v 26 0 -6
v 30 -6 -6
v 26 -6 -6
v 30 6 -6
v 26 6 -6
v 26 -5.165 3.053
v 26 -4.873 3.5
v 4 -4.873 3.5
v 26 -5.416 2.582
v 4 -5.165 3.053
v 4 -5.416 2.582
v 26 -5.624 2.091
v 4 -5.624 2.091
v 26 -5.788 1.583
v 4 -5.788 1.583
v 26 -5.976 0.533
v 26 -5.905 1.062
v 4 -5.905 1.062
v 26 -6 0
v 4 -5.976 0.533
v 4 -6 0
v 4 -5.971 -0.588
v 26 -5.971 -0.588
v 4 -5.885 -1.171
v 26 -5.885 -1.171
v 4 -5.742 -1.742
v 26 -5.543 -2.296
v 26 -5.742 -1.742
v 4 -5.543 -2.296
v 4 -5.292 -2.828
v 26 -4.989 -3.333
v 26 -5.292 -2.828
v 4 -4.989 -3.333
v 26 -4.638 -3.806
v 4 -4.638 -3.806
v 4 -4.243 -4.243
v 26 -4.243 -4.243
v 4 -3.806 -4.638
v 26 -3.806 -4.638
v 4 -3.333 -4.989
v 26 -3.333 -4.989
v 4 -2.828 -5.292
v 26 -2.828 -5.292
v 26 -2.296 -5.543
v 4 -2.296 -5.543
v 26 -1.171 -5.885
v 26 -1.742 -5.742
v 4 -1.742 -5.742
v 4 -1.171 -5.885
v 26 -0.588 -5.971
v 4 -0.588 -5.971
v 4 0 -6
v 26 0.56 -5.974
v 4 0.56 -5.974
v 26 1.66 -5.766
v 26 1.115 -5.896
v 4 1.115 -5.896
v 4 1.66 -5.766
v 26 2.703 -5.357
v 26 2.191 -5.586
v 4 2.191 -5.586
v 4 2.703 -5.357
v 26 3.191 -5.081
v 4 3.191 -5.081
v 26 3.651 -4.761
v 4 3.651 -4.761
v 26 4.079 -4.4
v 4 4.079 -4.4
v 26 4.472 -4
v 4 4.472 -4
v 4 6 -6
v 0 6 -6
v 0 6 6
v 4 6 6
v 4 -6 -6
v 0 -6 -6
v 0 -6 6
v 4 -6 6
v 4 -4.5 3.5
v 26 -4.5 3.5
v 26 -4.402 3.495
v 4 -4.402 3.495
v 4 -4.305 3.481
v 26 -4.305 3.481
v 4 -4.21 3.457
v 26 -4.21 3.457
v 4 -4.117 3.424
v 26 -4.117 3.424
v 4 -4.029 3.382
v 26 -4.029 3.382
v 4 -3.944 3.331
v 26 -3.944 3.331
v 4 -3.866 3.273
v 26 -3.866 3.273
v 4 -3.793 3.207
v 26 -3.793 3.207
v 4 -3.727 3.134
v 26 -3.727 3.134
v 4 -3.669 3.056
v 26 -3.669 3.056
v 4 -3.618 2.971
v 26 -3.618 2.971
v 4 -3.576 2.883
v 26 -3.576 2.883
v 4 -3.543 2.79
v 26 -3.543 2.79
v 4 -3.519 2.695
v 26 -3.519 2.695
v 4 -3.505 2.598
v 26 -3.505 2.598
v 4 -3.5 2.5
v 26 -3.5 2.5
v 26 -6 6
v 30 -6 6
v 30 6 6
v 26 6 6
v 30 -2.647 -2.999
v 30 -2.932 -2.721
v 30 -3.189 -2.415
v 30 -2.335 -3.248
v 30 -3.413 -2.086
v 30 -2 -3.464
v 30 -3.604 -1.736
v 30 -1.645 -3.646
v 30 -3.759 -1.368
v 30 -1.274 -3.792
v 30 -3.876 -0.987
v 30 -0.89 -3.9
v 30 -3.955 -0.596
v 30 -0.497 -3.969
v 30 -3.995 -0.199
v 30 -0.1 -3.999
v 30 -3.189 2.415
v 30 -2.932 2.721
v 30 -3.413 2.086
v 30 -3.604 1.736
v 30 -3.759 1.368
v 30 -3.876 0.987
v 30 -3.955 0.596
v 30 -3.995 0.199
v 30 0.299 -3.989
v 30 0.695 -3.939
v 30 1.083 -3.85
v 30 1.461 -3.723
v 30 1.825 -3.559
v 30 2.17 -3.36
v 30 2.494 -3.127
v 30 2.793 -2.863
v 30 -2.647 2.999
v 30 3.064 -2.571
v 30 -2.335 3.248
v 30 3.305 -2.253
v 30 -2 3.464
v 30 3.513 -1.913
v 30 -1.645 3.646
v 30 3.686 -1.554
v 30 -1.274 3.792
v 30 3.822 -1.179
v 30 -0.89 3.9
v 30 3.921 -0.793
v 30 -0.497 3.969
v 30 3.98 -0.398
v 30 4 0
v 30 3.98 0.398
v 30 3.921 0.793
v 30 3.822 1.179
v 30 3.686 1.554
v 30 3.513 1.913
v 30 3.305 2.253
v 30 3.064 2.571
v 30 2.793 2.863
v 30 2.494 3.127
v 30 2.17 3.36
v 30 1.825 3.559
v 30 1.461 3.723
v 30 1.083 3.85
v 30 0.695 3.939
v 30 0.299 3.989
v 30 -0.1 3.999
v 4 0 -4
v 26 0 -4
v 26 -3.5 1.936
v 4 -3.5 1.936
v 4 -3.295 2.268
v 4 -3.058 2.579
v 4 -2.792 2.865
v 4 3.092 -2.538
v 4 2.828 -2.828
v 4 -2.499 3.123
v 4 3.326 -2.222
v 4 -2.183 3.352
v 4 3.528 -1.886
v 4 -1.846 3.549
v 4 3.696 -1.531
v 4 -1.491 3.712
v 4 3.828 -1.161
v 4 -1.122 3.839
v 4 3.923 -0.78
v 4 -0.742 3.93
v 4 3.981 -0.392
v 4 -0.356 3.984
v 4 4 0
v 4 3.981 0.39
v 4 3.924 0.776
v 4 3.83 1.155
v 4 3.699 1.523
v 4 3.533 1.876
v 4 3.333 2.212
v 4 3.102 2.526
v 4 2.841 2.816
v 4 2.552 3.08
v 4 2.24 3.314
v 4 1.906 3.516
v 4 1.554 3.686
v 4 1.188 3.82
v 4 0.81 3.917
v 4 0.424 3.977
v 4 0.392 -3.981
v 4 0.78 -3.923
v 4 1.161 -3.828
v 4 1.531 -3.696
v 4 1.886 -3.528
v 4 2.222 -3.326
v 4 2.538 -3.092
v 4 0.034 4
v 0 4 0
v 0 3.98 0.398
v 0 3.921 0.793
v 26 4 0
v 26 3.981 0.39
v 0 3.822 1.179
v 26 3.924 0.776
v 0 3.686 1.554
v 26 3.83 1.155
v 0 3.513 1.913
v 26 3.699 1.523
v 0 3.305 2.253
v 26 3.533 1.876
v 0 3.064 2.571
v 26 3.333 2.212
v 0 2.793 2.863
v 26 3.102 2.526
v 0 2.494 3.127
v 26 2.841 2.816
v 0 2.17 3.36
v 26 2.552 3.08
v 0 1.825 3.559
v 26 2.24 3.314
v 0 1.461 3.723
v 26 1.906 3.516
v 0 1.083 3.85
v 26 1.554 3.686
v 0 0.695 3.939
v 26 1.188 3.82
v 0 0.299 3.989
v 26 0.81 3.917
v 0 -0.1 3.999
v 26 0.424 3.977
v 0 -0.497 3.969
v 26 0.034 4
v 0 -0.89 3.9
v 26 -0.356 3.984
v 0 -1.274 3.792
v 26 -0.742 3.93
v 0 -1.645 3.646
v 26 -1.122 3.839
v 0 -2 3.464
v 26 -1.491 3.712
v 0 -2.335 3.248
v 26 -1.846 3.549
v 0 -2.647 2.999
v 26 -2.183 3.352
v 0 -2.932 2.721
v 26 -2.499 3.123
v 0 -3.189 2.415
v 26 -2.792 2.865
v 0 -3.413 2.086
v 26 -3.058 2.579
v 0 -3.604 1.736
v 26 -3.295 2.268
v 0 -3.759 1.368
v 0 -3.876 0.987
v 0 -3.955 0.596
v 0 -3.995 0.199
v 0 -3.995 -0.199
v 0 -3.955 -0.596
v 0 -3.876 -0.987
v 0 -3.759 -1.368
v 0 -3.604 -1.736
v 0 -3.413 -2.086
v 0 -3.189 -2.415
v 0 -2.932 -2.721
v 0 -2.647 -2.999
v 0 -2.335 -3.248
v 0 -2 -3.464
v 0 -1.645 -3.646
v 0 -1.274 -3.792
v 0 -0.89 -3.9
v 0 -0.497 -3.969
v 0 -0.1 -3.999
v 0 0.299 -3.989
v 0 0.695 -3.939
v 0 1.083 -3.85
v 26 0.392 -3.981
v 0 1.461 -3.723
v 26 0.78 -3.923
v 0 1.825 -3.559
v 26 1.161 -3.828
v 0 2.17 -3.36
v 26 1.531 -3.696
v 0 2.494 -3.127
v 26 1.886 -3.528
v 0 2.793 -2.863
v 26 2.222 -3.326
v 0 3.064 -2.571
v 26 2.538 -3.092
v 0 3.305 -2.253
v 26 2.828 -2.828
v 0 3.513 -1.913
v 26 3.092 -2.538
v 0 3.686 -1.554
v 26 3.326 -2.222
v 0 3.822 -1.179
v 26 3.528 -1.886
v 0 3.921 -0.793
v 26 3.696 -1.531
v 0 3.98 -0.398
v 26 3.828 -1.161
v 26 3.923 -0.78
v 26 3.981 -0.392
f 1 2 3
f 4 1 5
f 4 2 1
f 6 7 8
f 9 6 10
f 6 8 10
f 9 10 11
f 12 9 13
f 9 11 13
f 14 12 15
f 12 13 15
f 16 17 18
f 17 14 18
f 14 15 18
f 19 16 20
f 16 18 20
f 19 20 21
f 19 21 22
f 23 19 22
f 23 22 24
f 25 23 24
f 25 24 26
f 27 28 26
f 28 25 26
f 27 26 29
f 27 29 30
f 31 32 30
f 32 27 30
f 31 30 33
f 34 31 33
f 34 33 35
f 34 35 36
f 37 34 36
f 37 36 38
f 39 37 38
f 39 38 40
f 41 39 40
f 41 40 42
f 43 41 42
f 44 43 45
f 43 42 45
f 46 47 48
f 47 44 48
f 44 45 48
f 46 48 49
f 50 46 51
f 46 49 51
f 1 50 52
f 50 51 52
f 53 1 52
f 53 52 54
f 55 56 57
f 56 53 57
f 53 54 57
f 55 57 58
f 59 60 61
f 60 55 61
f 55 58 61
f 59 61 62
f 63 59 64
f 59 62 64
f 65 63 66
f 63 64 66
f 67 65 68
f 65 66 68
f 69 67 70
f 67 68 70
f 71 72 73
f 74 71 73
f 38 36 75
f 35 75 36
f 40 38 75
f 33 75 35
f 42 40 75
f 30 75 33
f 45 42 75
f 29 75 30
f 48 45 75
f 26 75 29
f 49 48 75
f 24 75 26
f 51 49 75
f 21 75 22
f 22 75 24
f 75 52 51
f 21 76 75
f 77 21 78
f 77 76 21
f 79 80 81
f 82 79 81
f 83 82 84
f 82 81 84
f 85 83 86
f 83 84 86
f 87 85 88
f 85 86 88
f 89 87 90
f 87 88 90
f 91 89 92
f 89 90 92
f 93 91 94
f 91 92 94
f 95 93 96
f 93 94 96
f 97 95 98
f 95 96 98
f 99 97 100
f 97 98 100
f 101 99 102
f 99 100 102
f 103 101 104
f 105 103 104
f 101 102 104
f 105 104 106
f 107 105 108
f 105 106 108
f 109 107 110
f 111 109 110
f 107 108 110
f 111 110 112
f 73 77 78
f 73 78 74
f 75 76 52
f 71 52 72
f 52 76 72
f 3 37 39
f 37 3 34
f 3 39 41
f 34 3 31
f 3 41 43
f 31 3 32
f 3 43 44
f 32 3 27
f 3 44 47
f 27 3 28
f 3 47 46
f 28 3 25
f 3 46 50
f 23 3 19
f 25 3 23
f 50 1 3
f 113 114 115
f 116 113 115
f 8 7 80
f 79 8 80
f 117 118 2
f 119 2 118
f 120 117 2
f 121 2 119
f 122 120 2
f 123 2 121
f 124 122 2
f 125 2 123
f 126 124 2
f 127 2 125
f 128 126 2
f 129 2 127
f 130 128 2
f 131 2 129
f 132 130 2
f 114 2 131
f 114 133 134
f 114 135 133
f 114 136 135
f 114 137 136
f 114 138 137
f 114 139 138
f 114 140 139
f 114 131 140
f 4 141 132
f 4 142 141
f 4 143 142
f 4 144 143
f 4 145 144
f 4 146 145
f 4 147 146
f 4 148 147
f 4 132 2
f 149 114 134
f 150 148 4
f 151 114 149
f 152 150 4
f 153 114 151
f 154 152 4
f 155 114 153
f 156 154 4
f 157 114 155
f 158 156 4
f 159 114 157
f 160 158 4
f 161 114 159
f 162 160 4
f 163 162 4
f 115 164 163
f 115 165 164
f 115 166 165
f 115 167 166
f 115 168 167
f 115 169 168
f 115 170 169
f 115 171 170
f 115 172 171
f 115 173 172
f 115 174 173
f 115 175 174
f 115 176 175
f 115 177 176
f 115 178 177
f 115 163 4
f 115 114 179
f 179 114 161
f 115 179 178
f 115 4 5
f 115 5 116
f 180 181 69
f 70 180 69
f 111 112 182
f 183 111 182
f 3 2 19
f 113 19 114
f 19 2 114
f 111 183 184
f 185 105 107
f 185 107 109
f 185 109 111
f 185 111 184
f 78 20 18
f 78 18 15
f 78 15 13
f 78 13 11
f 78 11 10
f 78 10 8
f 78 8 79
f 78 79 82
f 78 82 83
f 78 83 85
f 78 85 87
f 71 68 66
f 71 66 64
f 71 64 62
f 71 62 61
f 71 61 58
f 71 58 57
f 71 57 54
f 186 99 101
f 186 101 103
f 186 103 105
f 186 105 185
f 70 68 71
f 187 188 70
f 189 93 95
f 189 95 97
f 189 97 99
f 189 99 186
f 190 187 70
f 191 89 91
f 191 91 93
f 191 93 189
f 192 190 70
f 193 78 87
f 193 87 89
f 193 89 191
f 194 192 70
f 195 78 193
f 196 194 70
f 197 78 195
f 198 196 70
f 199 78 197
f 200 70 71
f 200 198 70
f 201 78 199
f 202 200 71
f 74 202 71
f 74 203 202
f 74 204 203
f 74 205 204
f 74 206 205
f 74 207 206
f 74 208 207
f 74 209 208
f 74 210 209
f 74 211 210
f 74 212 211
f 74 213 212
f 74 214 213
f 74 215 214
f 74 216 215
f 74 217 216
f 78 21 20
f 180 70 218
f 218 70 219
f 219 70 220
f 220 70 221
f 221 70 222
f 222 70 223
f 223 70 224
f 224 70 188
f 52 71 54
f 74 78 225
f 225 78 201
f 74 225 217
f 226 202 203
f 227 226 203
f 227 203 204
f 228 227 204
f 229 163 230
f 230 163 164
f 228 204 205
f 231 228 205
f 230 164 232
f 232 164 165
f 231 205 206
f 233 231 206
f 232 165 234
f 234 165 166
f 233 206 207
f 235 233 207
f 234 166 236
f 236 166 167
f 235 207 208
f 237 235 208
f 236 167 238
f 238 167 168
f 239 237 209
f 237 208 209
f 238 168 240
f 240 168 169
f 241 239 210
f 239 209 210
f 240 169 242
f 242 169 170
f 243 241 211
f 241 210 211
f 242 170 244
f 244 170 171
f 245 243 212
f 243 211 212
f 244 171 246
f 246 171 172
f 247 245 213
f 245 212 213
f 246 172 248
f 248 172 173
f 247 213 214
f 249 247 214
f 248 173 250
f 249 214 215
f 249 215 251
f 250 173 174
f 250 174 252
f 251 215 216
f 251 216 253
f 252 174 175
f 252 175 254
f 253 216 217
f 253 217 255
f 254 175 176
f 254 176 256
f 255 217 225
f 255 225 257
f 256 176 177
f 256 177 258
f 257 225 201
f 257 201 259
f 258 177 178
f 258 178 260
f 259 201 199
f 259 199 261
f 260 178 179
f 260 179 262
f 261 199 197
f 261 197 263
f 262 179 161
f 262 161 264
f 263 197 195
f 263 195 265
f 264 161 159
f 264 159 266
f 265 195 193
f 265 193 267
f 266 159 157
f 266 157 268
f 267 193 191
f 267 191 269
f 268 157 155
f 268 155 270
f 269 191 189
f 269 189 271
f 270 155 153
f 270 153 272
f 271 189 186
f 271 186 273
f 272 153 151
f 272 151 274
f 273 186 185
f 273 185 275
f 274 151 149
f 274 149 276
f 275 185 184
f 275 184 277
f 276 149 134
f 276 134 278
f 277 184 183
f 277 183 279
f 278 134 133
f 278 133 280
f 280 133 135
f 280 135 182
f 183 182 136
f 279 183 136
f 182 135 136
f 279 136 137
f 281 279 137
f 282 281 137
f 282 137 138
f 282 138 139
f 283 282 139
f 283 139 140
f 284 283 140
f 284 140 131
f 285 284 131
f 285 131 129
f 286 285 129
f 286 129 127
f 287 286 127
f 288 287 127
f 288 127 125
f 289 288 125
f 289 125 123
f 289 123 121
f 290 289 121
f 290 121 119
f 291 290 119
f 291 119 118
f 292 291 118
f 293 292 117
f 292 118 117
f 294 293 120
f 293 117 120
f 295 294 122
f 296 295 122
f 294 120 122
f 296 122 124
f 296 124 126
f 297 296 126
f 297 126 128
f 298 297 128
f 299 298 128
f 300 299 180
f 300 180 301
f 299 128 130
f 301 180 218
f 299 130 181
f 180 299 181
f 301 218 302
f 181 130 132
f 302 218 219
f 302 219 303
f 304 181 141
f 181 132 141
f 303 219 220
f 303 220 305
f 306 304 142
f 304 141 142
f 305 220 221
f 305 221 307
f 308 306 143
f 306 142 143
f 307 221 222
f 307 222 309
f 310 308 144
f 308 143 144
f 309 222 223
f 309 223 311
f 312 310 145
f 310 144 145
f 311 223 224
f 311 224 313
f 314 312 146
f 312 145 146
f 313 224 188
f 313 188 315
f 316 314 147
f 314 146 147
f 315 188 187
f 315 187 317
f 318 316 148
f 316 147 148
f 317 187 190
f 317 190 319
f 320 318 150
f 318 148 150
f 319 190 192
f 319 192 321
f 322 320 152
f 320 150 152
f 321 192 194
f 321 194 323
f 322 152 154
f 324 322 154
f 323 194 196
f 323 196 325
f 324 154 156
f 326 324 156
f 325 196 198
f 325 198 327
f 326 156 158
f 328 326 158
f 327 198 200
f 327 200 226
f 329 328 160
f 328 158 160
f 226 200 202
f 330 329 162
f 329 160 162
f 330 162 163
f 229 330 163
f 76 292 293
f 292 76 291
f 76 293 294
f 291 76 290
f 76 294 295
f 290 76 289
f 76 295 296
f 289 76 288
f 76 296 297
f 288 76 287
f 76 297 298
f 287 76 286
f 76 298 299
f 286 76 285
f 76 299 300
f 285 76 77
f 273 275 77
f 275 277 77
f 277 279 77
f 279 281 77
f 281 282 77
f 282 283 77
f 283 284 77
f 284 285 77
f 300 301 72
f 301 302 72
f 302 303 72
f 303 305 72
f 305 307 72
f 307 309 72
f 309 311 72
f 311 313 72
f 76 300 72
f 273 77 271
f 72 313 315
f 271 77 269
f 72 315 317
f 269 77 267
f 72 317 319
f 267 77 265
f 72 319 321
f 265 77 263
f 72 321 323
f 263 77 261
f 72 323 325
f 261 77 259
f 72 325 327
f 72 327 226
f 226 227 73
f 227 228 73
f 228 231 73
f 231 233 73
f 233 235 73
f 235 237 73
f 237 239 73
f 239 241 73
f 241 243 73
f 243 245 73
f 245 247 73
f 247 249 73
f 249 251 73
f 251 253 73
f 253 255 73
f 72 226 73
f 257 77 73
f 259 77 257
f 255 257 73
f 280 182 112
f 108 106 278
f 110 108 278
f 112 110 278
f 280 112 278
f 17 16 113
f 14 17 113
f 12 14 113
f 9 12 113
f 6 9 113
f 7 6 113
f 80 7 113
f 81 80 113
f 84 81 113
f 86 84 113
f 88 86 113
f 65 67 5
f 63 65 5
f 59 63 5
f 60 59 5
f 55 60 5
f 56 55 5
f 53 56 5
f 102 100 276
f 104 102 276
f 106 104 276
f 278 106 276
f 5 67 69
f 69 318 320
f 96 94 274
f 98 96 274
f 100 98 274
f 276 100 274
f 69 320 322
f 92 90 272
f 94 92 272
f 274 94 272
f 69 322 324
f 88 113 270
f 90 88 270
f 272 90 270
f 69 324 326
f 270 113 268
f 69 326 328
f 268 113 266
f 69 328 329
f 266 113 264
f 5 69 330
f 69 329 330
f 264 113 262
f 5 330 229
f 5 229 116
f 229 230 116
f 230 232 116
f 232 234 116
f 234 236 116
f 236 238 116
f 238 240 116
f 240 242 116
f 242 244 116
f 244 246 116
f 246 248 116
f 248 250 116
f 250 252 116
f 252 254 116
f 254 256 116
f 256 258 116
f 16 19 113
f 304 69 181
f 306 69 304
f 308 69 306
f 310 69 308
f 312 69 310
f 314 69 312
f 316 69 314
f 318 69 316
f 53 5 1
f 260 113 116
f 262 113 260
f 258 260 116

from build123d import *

# Parameters (mm, degrees)
F0_R     = 6
F1_DEPTH = 30
F2_R     = 4
F3_DEPTH = 30.001
F6_DEPTH = 22
F7_W     = 12
F7_H     = 12
F7_R     = 4
F9_DEPTH = 4


# Not quite as in the source:
# - a pattern or mirror of a feature is missing from the dataset's text; its kind, count and spacing are read off the source's solid


with BuildPart() as f1:
    # F0 (on Right) → F1 (new body)
    with BuildSketch(Plane.YZ):
        Circle(F0_R)
    extrude(amount=F1_DEPTH)

    # F2 (on face) → F3 (cut, through all)
    with BuildSketch(Plane.YZ.offset(30)):
        Circle(F2_R)
    extrude(amount=-F3_DEPTH, mode=Mode.SUBTRACT)

    # F5 (on offset) → F6 (cut)
    with BuildSketch(Plane.YZ.offset(26)):
        with BuildLine():
            Line((0, 0), (0, -4))
            Line((0, -4), (8, -4))
            Line((8, -4), (8.9776590466, 9.4645246863))
            Line((8.9776590466, 9.4645246863), (-7.7182371169, 9.4645246863))
            Line((-7.7182371169, 9.4645246863), (-7.7182371169, 3.5))
            Line((-7.7182371169, 3.5), (-4.5, 3.5))
            ThreePointArc((-4.5, 3.5), (-3.7928932188, 3.2071067812), (-3.5, 2.5))
            Line((-3.5, 2.5), (-3.5, 0))
            Line((-3.5, 0), (0, 0))
        make_face()
    extrude(amount=-F6_DEPTH, mode=Mode.SUBTRACT)

    # F7 (on face) → F9 (join)
    with BuildSketch(Plane.YZ.offset(30)):
        Rectangle(F7_W, F7_H)
        Circle(F7_R, mode=Mode.SUBTRACT)
    f9 = extrude(amount=-F9_DEPTH)

    # F9_copies: F9 across plane
    add(f9.mirror(Plane(origin=(15, 0, 0), x_dir=(0, 0, -1), z_dir=(-1, 0, 0))))


solid = f1.part
